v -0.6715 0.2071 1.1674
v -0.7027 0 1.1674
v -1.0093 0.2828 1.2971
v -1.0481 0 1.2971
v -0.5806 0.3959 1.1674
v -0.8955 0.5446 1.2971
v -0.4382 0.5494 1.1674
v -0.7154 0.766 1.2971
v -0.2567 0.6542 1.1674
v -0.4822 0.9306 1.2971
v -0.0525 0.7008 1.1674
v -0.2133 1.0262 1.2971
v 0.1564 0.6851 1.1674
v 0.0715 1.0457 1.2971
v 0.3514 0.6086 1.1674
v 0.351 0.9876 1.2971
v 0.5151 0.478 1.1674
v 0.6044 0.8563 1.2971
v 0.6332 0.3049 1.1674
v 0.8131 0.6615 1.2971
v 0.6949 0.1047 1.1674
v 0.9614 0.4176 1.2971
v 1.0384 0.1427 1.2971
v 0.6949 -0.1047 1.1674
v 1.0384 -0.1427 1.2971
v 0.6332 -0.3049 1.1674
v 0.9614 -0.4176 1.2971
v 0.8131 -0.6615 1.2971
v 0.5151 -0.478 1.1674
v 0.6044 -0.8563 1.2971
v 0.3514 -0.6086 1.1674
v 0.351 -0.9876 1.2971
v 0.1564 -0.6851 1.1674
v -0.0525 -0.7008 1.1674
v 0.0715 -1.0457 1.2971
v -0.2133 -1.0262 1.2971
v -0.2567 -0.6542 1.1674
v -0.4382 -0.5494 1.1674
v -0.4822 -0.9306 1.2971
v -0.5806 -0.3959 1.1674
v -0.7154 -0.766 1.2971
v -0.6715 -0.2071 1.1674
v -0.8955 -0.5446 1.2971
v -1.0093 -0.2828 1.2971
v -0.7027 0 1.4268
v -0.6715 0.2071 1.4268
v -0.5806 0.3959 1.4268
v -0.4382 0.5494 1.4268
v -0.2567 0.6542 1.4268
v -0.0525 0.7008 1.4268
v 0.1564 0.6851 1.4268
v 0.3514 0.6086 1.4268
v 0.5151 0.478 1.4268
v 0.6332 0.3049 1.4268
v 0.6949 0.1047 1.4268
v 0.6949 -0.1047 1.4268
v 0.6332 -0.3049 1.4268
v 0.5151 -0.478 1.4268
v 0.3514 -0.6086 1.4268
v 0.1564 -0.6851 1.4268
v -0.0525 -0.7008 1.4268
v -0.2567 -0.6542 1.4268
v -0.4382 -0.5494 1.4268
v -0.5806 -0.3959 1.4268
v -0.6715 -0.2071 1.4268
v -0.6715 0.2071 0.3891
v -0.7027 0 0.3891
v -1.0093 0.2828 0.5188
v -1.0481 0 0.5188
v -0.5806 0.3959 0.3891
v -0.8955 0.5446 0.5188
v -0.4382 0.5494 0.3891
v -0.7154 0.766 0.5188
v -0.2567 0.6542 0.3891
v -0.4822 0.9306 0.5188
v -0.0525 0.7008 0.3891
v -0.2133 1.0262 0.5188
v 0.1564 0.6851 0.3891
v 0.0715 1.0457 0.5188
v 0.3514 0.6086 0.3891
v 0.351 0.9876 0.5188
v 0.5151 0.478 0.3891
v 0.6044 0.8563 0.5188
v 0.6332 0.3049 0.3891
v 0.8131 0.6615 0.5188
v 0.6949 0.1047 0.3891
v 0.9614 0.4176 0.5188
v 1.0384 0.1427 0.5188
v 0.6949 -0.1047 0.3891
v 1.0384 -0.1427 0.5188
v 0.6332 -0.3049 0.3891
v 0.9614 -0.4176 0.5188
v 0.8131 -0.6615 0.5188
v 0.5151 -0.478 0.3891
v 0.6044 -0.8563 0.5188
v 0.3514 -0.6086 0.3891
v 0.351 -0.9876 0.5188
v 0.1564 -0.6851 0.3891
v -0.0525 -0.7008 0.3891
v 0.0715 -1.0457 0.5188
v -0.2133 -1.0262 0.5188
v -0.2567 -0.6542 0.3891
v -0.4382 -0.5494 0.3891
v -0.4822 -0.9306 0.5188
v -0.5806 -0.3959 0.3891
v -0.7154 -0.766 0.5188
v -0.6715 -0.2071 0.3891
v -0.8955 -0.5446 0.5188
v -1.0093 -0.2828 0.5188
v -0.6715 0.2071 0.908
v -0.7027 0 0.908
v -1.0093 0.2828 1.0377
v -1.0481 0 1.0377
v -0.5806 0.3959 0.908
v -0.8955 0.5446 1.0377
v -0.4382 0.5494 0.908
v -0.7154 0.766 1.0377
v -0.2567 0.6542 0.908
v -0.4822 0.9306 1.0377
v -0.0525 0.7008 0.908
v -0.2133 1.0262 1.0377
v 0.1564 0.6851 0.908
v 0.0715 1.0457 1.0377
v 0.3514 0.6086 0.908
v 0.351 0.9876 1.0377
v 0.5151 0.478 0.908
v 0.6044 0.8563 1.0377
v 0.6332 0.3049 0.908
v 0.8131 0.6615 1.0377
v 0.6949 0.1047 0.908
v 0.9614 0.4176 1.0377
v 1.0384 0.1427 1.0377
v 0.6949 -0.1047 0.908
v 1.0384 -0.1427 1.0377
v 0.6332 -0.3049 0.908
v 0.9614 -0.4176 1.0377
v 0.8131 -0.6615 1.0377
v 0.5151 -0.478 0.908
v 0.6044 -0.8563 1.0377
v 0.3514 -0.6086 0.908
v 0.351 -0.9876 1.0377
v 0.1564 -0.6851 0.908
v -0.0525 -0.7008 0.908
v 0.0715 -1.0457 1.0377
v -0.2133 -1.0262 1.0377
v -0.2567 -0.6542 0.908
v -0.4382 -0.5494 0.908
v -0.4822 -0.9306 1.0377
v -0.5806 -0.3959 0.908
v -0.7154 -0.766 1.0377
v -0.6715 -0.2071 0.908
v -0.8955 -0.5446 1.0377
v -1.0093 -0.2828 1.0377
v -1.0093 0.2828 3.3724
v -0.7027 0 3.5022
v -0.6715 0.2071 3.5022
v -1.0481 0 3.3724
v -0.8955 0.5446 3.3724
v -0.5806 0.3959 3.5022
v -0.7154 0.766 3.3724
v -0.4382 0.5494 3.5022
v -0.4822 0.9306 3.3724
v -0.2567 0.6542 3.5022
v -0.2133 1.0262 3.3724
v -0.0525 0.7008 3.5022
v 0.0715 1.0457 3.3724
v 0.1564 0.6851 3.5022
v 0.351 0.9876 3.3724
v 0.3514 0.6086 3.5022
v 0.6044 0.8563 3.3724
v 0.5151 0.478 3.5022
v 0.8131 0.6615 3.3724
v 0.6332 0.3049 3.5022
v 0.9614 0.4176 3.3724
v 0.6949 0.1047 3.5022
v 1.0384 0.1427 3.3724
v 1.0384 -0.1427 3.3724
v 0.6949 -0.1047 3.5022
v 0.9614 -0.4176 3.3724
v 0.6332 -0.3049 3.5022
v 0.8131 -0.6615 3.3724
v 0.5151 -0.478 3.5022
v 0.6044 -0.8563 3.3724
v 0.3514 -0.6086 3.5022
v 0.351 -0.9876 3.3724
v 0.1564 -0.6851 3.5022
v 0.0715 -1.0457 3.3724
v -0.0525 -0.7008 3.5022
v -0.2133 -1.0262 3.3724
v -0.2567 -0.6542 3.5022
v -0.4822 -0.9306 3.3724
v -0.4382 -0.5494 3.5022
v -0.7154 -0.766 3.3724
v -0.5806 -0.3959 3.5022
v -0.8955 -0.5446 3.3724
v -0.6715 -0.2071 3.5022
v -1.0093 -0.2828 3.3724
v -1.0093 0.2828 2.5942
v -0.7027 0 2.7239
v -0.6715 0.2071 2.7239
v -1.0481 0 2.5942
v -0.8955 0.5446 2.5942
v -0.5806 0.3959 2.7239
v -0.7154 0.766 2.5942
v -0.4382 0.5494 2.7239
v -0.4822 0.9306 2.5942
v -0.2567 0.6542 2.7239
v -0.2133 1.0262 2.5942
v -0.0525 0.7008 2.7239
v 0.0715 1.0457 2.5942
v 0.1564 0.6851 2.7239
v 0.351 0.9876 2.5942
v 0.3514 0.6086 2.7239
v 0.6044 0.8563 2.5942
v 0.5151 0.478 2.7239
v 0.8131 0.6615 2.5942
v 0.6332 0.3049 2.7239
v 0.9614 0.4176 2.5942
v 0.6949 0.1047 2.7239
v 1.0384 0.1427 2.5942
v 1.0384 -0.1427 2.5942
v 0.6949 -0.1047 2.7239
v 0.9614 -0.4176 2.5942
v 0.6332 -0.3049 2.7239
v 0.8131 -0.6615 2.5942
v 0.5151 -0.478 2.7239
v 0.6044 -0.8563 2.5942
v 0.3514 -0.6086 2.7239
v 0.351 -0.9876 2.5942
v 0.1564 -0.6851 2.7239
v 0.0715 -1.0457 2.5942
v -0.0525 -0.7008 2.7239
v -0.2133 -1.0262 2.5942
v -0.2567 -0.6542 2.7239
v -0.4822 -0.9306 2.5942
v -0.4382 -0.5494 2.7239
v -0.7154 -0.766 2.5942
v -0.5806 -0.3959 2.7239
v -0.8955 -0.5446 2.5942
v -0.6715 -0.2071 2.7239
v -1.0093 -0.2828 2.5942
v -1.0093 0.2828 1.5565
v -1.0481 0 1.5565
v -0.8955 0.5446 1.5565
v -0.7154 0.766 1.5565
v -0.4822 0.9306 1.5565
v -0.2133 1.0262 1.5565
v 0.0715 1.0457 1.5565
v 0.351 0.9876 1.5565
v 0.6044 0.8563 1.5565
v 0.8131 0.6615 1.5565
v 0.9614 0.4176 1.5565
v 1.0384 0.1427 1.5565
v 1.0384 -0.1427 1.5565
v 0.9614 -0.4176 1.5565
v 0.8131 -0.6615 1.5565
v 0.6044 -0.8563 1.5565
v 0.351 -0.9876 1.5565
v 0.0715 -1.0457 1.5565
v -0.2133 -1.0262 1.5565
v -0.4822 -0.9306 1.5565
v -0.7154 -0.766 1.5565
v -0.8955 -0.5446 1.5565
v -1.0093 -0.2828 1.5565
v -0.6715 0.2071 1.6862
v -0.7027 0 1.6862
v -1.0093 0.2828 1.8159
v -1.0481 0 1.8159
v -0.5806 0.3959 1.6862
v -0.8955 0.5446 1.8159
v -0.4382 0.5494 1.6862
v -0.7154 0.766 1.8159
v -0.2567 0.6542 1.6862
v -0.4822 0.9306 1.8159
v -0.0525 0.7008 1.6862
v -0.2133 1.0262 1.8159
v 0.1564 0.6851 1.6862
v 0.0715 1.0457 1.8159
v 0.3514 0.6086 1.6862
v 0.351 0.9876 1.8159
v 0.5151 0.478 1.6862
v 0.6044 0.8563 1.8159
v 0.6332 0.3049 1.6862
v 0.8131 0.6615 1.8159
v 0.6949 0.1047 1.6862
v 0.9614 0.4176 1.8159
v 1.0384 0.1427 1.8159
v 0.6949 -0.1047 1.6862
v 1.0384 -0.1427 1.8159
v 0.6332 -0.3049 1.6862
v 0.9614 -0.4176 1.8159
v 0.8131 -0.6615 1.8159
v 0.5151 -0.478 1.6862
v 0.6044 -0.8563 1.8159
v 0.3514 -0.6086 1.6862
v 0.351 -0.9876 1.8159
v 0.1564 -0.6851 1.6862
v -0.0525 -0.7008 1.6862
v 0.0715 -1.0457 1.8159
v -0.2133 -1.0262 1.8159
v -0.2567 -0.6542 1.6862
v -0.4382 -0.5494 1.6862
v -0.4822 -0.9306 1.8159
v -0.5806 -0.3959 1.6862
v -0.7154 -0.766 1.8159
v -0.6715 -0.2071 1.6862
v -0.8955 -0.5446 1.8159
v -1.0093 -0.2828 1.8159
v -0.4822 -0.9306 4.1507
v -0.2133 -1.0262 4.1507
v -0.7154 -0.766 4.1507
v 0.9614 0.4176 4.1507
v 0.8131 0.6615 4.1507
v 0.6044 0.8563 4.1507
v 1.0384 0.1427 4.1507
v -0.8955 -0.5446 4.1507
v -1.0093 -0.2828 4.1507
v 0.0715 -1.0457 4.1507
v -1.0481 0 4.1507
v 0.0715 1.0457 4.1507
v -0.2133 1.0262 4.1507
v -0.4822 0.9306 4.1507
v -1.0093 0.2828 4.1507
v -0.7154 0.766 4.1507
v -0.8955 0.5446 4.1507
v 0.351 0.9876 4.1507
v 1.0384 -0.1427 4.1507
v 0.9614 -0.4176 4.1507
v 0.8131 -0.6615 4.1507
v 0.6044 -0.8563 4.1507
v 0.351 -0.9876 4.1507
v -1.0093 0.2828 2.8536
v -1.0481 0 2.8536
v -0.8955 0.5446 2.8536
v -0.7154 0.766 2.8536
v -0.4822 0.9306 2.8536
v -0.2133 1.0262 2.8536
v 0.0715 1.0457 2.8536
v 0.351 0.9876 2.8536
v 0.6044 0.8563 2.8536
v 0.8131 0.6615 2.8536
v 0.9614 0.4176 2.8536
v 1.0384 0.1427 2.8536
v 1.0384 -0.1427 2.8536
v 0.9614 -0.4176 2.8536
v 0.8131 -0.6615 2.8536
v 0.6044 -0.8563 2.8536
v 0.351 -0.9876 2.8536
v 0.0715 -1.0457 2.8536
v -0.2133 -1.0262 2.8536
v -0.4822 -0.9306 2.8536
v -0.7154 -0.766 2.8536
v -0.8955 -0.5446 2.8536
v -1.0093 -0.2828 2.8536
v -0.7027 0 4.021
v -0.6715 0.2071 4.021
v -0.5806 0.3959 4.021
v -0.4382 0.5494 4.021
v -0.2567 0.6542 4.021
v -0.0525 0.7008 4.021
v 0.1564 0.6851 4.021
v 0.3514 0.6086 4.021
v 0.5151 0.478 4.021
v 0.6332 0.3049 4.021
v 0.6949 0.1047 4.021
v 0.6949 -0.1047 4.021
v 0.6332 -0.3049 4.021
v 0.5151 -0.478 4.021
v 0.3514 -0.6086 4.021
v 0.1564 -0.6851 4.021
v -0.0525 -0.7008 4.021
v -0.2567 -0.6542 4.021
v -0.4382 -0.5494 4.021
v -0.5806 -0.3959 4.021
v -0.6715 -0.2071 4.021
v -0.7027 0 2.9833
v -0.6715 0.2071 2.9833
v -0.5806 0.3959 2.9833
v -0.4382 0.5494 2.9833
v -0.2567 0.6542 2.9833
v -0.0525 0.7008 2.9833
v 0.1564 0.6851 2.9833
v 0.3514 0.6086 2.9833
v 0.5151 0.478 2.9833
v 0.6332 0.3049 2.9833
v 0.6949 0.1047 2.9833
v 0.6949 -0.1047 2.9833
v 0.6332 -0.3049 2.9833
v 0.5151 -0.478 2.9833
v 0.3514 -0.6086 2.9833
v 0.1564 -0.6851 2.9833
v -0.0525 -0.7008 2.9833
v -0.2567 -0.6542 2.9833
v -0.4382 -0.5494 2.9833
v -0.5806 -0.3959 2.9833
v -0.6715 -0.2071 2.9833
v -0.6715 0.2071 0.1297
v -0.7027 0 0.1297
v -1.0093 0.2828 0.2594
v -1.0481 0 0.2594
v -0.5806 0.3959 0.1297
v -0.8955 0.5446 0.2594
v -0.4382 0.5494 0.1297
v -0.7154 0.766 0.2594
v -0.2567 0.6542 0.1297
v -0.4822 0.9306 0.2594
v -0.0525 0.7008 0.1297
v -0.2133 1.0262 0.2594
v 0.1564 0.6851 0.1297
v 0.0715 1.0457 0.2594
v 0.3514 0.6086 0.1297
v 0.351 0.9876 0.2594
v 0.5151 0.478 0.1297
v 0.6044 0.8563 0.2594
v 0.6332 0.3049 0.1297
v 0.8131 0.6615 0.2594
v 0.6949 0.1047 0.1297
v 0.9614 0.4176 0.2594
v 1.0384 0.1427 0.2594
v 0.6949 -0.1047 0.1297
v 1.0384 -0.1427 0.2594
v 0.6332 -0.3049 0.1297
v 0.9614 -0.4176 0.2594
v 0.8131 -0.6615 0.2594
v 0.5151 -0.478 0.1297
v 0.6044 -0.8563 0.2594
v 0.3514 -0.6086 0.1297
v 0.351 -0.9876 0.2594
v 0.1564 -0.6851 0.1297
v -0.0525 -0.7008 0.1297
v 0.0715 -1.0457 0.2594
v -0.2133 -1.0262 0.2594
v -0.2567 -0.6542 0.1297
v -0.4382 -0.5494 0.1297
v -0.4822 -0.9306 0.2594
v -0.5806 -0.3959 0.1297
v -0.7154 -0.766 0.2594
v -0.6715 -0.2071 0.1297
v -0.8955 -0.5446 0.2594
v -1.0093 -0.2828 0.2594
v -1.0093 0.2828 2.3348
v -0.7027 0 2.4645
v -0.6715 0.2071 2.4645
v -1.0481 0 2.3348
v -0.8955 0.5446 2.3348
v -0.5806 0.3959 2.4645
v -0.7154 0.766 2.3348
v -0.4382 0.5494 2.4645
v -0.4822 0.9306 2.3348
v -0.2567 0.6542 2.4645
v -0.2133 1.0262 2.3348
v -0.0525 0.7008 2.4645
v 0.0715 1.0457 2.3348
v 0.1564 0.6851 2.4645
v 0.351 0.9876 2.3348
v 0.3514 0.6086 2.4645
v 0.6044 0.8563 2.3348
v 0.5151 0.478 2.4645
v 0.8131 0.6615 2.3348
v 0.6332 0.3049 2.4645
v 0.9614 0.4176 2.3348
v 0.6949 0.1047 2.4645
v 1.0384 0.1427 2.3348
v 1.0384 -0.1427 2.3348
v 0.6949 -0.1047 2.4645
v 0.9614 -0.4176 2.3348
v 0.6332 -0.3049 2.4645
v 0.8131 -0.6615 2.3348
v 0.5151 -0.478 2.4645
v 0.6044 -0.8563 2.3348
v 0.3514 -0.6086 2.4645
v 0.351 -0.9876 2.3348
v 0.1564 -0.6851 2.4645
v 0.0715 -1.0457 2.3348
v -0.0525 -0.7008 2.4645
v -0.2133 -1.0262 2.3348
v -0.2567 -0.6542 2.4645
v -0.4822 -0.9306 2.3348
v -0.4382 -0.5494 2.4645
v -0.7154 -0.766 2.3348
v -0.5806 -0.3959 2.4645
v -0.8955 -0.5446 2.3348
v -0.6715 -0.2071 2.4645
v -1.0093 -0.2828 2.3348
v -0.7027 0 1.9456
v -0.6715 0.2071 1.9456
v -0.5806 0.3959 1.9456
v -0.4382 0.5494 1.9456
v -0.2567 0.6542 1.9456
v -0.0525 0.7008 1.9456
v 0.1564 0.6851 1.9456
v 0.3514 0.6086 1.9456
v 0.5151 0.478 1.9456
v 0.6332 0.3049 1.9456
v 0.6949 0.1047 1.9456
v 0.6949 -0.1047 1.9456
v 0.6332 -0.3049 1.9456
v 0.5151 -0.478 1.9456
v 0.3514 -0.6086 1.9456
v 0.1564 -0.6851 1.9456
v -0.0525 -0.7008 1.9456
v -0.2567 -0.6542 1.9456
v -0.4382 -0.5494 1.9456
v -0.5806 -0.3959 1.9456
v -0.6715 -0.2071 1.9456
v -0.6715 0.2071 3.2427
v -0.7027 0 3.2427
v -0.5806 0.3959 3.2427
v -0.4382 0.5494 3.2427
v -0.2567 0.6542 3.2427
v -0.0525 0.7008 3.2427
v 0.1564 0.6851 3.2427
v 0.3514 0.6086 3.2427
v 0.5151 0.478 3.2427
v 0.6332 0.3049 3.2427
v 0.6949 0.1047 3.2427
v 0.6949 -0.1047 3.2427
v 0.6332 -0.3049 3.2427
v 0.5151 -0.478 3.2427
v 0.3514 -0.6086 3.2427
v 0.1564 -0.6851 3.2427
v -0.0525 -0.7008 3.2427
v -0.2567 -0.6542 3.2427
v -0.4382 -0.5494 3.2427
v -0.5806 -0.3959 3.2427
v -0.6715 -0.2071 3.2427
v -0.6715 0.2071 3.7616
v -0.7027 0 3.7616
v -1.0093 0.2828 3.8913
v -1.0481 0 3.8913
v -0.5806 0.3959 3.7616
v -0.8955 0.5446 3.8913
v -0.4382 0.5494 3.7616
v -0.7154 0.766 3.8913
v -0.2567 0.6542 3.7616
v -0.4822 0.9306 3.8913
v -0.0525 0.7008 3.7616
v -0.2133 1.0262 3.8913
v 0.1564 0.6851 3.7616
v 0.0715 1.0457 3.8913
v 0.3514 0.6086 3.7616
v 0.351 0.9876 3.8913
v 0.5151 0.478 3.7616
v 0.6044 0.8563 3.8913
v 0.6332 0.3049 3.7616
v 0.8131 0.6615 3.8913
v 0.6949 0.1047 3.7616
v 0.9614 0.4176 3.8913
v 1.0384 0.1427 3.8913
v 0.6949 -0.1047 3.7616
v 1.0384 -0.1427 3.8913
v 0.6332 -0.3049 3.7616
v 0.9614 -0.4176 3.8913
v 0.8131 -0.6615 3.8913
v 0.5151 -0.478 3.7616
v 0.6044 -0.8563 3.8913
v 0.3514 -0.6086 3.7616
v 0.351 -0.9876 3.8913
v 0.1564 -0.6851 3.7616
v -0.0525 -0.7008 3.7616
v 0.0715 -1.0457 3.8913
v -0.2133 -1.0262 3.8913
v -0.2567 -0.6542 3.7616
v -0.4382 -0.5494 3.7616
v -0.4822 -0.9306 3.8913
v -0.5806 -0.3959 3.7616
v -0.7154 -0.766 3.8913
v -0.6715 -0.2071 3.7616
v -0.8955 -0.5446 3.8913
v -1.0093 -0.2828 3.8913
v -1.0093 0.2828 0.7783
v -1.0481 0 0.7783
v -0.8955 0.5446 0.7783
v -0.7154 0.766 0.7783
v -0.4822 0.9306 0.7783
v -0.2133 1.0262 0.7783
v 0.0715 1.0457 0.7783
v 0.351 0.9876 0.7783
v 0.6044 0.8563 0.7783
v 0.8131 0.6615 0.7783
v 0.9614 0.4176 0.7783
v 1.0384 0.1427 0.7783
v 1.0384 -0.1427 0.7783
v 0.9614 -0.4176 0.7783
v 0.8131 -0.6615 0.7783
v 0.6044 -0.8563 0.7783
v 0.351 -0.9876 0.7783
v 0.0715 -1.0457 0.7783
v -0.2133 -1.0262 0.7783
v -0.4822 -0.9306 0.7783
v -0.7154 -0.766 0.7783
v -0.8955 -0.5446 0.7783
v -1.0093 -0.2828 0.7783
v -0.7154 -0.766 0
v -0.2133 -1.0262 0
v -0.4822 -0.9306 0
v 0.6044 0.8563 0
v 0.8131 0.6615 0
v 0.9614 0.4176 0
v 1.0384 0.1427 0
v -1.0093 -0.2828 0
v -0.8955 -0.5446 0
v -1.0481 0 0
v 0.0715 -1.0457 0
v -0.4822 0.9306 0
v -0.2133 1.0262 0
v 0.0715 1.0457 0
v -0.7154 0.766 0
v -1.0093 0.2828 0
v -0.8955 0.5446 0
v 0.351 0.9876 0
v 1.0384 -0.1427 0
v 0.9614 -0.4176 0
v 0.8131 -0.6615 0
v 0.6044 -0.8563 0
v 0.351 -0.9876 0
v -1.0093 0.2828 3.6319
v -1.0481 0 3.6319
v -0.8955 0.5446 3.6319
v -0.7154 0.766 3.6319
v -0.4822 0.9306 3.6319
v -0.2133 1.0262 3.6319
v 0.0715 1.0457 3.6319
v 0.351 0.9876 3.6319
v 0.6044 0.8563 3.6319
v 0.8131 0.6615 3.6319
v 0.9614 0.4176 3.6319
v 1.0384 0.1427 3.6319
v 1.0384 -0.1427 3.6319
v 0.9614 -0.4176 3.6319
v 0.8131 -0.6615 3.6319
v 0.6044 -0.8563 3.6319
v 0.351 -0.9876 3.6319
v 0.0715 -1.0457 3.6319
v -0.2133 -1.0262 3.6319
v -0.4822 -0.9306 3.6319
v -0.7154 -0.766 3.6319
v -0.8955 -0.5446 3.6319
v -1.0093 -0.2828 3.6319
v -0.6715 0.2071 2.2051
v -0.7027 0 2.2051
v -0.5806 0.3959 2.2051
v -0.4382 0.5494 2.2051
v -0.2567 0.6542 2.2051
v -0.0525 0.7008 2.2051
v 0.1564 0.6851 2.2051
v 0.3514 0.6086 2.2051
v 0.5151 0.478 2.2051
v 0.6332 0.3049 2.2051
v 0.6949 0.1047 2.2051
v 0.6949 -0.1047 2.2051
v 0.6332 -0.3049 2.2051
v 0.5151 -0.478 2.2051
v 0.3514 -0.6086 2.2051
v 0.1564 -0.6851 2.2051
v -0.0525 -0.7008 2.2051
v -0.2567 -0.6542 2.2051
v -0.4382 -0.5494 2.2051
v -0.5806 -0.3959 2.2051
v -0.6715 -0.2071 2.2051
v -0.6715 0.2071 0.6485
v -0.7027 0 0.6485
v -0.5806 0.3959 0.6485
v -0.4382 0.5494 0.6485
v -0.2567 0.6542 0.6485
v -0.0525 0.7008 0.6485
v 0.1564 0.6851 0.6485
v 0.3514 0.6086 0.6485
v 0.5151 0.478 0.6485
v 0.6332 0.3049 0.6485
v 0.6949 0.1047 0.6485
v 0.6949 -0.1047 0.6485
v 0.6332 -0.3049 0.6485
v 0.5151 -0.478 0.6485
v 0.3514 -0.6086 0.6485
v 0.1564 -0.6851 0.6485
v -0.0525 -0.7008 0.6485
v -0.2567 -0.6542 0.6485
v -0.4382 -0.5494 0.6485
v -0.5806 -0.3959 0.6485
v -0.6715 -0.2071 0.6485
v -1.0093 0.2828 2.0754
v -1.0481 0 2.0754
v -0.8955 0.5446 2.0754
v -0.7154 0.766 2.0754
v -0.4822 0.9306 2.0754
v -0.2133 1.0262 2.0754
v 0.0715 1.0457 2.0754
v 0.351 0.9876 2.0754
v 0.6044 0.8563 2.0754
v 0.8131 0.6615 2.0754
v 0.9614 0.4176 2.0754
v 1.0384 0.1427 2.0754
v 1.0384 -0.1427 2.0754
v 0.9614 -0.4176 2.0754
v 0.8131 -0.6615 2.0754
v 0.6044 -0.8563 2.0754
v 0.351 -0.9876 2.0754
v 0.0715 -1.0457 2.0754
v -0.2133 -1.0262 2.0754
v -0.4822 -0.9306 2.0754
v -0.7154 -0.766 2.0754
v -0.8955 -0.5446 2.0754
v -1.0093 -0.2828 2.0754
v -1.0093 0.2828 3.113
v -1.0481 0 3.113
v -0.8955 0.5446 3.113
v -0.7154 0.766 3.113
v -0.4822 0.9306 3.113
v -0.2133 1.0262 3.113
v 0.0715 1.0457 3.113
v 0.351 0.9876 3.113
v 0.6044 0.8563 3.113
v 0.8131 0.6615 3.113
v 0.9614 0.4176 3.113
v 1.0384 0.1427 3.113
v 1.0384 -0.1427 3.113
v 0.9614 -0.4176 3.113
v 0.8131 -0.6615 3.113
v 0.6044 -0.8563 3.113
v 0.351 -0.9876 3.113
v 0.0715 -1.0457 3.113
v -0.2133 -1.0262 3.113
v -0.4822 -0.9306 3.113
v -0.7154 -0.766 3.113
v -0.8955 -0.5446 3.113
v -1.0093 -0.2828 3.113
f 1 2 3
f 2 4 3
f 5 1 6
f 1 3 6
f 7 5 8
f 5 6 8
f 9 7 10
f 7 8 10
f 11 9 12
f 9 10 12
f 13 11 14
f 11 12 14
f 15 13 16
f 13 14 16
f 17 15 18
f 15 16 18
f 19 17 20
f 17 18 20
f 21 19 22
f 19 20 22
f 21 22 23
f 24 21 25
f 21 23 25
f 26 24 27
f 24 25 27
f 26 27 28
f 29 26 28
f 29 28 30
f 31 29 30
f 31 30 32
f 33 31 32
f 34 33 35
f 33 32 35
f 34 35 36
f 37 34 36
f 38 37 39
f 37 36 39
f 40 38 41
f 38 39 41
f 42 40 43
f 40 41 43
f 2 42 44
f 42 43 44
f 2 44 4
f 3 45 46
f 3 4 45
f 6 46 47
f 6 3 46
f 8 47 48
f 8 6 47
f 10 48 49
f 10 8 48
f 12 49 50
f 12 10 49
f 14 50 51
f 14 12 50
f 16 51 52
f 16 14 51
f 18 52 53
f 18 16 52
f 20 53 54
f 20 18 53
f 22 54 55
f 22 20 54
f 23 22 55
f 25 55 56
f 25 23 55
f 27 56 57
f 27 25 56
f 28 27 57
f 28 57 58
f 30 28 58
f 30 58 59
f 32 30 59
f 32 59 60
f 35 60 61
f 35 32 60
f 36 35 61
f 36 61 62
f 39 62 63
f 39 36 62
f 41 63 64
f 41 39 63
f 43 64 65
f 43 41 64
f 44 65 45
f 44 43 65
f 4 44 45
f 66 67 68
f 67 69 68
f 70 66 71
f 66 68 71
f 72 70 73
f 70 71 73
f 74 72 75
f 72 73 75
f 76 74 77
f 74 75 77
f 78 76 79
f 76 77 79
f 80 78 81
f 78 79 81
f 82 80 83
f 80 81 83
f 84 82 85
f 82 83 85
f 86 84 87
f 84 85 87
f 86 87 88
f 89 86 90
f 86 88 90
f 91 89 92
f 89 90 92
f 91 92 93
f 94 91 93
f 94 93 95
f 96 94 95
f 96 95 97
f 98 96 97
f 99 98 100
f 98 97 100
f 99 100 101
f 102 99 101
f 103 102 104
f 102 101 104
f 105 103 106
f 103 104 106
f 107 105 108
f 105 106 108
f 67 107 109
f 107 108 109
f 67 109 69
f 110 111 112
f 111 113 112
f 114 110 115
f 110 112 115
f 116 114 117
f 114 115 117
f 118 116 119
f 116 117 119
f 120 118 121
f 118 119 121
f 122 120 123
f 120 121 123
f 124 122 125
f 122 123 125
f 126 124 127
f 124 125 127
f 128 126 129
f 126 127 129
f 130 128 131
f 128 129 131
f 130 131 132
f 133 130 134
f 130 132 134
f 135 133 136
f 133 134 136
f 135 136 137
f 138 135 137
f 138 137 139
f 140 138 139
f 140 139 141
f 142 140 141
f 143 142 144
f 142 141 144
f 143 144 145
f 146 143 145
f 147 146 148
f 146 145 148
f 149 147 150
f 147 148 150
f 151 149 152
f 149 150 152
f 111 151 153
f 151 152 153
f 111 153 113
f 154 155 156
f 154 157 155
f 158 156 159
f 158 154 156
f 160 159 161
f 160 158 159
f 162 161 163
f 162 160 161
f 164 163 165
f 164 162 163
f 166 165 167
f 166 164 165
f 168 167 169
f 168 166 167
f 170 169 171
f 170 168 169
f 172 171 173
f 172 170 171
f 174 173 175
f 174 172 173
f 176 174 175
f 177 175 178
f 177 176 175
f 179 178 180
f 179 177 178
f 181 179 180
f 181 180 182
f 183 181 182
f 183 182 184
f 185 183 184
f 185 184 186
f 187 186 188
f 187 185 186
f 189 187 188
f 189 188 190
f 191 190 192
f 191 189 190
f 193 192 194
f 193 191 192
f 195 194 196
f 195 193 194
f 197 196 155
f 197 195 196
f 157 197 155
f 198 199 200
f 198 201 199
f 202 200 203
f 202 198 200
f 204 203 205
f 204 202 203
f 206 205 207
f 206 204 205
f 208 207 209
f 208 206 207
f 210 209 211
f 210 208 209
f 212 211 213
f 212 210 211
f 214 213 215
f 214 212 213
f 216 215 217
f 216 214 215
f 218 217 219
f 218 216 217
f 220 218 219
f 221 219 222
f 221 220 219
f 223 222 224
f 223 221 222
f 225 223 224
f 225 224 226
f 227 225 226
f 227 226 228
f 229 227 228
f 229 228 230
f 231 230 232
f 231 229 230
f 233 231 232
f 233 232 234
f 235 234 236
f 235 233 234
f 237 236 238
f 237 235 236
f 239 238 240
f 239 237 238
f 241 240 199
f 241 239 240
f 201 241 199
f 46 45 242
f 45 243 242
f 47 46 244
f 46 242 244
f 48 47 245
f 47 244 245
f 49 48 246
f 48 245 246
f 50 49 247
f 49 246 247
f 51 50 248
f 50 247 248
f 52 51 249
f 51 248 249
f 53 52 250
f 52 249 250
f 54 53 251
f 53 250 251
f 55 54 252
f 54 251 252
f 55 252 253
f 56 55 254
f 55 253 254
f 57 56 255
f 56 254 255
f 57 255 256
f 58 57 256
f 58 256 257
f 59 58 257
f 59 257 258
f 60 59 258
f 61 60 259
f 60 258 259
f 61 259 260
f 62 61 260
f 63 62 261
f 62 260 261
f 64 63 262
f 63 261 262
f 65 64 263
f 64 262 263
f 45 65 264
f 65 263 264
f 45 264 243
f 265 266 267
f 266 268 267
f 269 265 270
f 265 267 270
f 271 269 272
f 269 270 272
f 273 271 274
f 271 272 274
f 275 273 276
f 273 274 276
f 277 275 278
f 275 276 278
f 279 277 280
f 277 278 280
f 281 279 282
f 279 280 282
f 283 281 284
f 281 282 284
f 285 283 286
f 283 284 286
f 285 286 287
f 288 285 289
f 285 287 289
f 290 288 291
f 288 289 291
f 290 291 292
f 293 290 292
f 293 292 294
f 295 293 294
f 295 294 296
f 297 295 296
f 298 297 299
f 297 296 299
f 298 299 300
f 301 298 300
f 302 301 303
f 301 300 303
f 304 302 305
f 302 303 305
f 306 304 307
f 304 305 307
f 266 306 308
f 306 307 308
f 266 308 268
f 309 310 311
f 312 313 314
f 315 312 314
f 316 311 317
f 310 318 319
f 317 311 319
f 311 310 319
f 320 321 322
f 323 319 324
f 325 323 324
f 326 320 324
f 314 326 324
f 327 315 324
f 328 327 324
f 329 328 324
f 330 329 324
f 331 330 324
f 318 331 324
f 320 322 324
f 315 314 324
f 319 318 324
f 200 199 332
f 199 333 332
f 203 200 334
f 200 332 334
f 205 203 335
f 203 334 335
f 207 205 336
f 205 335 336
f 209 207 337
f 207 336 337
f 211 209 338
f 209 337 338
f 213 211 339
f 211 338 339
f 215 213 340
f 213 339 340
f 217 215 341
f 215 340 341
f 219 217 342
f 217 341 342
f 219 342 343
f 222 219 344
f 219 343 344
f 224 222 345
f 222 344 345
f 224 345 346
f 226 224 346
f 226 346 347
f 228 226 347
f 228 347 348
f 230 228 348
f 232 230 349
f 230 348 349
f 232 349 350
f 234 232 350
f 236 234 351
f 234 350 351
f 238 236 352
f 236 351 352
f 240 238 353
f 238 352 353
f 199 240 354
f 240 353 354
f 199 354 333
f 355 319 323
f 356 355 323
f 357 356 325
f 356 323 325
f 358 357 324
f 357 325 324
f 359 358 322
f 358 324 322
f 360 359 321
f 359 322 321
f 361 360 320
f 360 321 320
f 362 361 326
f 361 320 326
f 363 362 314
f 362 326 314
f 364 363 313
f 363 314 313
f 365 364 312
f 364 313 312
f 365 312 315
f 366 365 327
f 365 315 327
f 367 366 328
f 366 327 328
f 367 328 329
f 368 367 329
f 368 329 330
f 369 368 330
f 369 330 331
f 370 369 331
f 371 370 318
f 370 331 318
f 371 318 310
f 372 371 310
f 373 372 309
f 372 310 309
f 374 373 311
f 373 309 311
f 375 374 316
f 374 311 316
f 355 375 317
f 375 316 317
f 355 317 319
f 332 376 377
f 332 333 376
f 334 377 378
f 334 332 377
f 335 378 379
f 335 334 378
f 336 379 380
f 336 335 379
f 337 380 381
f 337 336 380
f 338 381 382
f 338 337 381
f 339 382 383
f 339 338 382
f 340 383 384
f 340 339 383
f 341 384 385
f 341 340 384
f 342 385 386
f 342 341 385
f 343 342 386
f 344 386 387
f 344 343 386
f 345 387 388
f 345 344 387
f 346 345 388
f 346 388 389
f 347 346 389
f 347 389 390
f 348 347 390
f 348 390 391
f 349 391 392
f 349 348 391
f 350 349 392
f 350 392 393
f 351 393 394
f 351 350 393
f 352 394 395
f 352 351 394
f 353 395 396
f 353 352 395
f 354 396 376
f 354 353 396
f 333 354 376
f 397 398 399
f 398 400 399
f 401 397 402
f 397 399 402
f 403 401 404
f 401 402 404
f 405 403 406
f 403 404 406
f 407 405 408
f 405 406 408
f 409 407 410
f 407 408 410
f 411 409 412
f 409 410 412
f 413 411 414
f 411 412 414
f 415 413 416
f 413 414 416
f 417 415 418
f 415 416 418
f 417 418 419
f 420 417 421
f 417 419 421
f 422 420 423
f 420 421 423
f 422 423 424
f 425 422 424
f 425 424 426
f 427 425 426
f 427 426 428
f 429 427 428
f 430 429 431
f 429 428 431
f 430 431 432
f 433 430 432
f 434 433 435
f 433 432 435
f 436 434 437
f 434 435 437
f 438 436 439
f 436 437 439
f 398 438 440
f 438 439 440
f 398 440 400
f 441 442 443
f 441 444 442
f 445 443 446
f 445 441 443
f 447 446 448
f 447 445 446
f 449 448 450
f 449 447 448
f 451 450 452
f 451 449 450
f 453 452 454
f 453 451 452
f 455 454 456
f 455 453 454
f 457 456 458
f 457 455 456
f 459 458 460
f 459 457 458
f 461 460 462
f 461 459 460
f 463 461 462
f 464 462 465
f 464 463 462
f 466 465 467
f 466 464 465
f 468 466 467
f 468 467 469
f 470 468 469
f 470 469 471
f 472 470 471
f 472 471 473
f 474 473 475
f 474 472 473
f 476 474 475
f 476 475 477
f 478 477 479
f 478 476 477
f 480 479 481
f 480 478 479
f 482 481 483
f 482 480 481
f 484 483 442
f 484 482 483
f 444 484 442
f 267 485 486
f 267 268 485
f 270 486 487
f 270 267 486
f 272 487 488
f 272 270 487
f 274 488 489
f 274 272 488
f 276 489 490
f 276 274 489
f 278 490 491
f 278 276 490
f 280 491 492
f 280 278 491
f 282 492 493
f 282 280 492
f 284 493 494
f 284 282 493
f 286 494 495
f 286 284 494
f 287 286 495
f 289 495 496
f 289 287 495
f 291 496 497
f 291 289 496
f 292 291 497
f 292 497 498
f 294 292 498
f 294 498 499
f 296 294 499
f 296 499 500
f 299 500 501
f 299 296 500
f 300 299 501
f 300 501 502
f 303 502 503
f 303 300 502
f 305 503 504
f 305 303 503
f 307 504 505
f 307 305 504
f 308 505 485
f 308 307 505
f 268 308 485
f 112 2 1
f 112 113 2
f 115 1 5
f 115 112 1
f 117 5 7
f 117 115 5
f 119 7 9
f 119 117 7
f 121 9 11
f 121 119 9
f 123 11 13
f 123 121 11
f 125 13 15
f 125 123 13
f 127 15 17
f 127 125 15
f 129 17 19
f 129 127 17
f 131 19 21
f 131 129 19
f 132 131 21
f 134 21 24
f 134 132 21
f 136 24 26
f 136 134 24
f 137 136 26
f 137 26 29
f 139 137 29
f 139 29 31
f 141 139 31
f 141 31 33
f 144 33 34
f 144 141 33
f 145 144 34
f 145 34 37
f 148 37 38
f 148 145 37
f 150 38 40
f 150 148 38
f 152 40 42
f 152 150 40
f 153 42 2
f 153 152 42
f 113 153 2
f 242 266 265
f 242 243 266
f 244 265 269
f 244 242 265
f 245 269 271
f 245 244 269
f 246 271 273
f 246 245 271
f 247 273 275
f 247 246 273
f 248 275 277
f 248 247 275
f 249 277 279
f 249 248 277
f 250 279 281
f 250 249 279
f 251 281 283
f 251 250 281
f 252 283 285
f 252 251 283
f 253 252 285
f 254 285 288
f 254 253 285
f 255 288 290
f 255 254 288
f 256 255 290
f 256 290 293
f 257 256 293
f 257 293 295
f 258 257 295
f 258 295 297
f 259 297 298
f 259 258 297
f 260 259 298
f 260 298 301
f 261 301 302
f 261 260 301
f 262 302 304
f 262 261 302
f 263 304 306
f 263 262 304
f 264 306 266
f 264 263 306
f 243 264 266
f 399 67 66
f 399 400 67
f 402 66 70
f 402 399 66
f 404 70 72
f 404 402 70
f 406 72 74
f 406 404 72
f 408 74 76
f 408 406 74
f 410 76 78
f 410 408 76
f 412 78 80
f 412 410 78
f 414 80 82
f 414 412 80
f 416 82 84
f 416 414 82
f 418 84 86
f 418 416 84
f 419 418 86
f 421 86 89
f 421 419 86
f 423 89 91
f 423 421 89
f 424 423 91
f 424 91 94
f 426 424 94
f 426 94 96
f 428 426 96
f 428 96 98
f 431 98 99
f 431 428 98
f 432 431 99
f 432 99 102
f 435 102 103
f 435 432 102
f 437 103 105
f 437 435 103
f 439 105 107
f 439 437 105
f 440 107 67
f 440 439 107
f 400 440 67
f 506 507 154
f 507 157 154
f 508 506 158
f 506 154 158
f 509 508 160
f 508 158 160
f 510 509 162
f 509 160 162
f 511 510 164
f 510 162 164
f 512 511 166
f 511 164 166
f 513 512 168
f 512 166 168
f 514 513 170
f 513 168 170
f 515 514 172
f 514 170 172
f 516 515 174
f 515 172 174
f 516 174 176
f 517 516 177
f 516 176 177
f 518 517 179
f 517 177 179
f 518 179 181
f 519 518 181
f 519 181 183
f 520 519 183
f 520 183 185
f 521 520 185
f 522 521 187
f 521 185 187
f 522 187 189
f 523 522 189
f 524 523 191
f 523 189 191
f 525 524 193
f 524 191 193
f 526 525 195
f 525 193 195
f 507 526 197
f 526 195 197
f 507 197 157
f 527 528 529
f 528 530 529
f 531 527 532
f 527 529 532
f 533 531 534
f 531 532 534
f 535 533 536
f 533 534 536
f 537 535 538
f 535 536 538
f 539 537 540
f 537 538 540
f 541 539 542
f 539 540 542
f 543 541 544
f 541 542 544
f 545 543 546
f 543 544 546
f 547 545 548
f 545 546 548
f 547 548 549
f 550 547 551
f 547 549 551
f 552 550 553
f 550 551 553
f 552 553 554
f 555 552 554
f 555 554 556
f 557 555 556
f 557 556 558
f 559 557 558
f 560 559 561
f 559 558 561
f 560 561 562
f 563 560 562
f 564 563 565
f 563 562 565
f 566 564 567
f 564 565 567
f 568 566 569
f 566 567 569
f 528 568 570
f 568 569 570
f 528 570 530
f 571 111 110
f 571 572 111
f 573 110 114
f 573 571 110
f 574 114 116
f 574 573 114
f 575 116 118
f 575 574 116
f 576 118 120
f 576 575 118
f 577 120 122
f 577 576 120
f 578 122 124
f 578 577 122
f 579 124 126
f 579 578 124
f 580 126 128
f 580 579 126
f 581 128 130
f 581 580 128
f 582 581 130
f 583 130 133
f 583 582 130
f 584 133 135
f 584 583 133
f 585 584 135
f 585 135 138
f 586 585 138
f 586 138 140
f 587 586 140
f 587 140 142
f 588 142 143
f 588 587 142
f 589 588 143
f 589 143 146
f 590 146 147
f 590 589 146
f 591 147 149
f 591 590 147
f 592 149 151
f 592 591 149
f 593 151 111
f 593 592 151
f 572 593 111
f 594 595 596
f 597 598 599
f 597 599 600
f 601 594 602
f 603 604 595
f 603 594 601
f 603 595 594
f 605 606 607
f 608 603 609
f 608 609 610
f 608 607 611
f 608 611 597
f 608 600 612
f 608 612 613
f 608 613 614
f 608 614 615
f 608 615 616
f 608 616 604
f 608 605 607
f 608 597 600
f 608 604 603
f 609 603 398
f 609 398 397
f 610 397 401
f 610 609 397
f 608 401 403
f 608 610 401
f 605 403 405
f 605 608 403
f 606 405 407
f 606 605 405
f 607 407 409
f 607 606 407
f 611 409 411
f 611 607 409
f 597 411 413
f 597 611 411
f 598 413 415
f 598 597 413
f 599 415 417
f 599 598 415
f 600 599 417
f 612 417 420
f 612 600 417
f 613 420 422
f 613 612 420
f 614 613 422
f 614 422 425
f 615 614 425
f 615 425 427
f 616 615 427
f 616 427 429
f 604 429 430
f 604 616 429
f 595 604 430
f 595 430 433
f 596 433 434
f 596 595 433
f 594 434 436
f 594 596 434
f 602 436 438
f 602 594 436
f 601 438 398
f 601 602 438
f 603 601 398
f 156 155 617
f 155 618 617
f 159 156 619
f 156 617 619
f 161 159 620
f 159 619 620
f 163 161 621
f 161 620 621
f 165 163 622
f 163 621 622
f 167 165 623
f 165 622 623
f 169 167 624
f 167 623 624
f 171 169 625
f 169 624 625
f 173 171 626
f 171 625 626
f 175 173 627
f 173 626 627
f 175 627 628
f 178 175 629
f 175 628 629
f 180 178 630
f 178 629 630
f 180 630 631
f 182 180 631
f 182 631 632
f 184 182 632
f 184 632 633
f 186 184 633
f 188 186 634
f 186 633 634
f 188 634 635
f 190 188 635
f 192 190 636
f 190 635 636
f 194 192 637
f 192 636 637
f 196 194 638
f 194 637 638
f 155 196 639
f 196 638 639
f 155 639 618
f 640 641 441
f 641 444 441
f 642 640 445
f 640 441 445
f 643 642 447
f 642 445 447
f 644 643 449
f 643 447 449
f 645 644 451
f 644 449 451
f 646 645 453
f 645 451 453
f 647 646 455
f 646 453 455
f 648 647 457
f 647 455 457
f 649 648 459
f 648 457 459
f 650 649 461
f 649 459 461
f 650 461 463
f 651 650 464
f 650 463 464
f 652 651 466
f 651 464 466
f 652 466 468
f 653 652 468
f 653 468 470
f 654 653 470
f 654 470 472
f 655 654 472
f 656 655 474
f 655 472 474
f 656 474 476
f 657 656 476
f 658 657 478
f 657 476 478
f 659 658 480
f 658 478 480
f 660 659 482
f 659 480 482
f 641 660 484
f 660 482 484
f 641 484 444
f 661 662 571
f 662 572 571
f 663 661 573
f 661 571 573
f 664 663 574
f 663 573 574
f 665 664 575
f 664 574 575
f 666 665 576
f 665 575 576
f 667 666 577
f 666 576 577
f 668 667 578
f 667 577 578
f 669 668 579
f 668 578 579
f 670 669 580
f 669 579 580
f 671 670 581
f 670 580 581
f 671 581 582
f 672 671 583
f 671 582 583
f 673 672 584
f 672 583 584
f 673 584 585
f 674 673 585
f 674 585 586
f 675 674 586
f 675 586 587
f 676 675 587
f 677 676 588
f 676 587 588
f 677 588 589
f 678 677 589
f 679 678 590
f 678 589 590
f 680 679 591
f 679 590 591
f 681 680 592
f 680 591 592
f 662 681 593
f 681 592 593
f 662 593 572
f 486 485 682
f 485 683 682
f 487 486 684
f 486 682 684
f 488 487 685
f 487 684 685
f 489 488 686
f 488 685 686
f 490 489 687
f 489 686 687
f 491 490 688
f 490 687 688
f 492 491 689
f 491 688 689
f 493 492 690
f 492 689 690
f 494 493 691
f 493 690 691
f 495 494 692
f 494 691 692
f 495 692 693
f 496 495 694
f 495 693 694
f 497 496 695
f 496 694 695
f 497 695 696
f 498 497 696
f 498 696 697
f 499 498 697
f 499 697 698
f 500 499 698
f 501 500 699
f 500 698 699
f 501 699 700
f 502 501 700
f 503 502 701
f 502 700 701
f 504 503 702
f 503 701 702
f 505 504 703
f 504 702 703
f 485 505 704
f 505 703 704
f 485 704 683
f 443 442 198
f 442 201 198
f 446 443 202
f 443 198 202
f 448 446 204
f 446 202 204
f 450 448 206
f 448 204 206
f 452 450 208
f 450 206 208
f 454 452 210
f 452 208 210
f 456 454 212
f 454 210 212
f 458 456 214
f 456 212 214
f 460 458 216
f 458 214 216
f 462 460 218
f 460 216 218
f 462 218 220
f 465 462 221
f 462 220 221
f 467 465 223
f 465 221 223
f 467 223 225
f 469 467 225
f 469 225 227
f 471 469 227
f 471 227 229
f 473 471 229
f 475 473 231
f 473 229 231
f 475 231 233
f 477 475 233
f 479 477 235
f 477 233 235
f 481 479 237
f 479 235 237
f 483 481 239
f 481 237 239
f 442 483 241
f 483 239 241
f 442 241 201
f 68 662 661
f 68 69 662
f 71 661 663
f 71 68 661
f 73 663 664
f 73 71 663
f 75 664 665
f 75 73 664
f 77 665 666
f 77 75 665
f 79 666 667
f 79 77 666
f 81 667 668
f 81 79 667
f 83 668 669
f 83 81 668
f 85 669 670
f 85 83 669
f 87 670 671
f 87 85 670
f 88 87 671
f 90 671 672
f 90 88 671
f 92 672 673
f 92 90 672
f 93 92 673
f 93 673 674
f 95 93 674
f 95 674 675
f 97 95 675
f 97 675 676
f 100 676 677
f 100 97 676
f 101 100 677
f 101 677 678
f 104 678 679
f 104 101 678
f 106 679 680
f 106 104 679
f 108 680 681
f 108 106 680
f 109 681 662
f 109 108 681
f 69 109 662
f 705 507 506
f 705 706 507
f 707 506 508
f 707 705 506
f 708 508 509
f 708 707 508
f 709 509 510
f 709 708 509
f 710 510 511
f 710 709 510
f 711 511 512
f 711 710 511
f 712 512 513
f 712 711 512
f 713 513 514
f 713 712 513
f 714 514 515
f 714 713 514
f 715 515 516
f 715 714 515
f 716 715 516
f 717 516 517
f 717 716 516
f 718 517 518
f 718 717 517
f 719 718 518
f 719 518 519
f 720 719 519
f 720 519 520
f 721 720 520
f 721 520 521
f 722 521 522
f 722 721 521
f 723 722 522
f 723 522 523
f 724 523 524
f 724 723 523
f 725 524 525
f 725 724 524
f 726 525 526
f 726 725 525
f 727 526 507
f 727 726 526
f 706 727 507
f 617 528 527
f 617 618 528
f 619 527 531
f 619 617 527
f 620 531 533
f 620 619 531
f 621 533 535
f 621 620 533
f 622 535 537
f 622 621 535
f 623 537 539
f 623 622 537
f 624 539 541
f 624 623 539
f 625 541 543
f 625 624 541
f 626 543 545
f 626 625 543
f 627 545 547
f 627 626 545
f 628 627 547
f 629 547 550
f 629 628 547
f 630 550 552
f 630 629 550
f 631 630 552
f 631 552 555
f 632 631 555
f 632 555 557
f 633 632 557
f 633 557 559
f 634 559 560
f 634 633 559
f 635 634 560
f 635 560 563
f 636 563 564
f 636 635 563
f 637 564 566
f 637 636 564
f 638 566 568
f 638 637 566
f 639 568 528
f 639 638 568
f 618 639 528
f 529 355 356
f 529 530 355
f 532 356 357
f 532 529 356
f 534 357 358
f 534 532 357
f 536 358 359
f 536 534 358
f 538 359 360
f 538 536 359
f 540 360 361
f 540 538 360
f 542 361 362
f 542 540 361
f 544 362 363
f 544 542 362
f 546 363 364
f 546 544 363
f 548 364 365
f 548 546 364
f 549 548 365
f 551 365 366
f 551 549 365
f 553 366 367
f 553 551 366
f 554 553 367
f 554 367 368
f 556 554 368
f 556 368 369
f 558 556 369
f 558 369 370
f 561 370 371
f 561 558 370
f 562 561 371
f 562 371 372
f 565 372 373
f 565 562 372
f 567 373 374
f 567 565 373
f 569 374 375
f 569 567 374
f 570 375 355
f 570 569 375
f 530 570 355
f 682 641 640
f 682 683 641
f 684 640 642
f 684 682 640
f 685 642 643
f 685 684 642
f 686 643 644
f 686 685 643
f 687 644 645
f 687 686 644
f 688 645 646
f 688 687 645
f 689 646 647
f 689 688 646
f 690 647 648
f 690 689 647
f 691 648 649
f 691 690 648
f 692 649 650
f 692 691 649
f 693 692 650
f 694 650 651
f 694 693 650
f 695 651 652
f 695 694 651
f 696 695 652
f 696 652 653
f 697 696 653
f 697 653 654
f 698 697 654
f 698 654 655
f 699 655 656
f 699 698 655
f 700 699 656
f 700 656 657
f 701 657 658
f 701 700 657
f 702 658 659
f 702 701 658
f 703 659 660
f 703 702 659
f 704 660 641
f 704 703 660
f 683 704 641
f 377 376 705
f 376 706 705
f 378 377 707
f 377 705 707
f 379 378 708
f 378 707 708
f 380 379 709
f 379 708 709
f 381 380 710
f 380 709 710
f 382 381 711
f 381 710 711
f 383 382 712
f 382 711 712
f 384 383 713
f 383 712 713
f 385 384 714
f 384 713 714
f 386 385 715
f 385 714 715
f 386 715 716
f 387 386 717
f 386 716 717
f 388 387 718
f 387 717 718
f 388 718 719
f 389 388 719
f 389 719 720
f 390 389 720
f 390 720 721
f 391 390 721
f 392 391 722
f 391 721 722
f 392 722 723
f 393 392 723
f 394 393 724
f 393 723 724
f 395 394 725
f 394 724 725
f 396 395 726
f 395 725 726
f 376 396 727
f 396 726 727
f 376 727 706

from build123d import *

# Parameters (mm, degrees)
F7_SCALE = 10


with BuildPart() as f1:
    # F0 (on Front) → F1 (revolve)
    with BuildSketch(Plane.XZ):
        Polygon((-0.1048138583, 0), (0, 0), (0, 0.0129709415), (-0.0702744146, 0.0129709415), align=None)
    revolve(axis=Axis((0, 0, 0.0064854707), (0, 0, -1)))

    # F2: F1 across face


with BuildPart() as f1_1:
    add(f1.part)
    add(f1.part.mirror(Plane.XY.offset(0.0129709415)))

    # F3: F1 across face


with BuildPart() as f1_2:
    add(f1_1.part)
    add(f1_1.part.mirror(Plane.XY.offset(0.025941883)))

    # F4: F1 across face


with BuildPart() as f1_3:
    add(f1_2.part)
    add(f1_2.part.mirror(Plane.XY.offset(0.051883766)))

    # F5: F1 across face


with BuildPart() as f1_4:
    add(f1_3.part)
    add(f1_3.part.mirror(Plane.XY.offset(0.103767532)))

    # F6: F1 across face


with BuildPart() as f1_5:
    add(f1_4.part)
    add(f1_4.part.mirror(Plane.XY.offset(0.207535064)))


with BuildPart() as f1_6:
    # F7: moved
    add(f1_5.part.scale(F7_SCALE))


solid = f1_6.part
